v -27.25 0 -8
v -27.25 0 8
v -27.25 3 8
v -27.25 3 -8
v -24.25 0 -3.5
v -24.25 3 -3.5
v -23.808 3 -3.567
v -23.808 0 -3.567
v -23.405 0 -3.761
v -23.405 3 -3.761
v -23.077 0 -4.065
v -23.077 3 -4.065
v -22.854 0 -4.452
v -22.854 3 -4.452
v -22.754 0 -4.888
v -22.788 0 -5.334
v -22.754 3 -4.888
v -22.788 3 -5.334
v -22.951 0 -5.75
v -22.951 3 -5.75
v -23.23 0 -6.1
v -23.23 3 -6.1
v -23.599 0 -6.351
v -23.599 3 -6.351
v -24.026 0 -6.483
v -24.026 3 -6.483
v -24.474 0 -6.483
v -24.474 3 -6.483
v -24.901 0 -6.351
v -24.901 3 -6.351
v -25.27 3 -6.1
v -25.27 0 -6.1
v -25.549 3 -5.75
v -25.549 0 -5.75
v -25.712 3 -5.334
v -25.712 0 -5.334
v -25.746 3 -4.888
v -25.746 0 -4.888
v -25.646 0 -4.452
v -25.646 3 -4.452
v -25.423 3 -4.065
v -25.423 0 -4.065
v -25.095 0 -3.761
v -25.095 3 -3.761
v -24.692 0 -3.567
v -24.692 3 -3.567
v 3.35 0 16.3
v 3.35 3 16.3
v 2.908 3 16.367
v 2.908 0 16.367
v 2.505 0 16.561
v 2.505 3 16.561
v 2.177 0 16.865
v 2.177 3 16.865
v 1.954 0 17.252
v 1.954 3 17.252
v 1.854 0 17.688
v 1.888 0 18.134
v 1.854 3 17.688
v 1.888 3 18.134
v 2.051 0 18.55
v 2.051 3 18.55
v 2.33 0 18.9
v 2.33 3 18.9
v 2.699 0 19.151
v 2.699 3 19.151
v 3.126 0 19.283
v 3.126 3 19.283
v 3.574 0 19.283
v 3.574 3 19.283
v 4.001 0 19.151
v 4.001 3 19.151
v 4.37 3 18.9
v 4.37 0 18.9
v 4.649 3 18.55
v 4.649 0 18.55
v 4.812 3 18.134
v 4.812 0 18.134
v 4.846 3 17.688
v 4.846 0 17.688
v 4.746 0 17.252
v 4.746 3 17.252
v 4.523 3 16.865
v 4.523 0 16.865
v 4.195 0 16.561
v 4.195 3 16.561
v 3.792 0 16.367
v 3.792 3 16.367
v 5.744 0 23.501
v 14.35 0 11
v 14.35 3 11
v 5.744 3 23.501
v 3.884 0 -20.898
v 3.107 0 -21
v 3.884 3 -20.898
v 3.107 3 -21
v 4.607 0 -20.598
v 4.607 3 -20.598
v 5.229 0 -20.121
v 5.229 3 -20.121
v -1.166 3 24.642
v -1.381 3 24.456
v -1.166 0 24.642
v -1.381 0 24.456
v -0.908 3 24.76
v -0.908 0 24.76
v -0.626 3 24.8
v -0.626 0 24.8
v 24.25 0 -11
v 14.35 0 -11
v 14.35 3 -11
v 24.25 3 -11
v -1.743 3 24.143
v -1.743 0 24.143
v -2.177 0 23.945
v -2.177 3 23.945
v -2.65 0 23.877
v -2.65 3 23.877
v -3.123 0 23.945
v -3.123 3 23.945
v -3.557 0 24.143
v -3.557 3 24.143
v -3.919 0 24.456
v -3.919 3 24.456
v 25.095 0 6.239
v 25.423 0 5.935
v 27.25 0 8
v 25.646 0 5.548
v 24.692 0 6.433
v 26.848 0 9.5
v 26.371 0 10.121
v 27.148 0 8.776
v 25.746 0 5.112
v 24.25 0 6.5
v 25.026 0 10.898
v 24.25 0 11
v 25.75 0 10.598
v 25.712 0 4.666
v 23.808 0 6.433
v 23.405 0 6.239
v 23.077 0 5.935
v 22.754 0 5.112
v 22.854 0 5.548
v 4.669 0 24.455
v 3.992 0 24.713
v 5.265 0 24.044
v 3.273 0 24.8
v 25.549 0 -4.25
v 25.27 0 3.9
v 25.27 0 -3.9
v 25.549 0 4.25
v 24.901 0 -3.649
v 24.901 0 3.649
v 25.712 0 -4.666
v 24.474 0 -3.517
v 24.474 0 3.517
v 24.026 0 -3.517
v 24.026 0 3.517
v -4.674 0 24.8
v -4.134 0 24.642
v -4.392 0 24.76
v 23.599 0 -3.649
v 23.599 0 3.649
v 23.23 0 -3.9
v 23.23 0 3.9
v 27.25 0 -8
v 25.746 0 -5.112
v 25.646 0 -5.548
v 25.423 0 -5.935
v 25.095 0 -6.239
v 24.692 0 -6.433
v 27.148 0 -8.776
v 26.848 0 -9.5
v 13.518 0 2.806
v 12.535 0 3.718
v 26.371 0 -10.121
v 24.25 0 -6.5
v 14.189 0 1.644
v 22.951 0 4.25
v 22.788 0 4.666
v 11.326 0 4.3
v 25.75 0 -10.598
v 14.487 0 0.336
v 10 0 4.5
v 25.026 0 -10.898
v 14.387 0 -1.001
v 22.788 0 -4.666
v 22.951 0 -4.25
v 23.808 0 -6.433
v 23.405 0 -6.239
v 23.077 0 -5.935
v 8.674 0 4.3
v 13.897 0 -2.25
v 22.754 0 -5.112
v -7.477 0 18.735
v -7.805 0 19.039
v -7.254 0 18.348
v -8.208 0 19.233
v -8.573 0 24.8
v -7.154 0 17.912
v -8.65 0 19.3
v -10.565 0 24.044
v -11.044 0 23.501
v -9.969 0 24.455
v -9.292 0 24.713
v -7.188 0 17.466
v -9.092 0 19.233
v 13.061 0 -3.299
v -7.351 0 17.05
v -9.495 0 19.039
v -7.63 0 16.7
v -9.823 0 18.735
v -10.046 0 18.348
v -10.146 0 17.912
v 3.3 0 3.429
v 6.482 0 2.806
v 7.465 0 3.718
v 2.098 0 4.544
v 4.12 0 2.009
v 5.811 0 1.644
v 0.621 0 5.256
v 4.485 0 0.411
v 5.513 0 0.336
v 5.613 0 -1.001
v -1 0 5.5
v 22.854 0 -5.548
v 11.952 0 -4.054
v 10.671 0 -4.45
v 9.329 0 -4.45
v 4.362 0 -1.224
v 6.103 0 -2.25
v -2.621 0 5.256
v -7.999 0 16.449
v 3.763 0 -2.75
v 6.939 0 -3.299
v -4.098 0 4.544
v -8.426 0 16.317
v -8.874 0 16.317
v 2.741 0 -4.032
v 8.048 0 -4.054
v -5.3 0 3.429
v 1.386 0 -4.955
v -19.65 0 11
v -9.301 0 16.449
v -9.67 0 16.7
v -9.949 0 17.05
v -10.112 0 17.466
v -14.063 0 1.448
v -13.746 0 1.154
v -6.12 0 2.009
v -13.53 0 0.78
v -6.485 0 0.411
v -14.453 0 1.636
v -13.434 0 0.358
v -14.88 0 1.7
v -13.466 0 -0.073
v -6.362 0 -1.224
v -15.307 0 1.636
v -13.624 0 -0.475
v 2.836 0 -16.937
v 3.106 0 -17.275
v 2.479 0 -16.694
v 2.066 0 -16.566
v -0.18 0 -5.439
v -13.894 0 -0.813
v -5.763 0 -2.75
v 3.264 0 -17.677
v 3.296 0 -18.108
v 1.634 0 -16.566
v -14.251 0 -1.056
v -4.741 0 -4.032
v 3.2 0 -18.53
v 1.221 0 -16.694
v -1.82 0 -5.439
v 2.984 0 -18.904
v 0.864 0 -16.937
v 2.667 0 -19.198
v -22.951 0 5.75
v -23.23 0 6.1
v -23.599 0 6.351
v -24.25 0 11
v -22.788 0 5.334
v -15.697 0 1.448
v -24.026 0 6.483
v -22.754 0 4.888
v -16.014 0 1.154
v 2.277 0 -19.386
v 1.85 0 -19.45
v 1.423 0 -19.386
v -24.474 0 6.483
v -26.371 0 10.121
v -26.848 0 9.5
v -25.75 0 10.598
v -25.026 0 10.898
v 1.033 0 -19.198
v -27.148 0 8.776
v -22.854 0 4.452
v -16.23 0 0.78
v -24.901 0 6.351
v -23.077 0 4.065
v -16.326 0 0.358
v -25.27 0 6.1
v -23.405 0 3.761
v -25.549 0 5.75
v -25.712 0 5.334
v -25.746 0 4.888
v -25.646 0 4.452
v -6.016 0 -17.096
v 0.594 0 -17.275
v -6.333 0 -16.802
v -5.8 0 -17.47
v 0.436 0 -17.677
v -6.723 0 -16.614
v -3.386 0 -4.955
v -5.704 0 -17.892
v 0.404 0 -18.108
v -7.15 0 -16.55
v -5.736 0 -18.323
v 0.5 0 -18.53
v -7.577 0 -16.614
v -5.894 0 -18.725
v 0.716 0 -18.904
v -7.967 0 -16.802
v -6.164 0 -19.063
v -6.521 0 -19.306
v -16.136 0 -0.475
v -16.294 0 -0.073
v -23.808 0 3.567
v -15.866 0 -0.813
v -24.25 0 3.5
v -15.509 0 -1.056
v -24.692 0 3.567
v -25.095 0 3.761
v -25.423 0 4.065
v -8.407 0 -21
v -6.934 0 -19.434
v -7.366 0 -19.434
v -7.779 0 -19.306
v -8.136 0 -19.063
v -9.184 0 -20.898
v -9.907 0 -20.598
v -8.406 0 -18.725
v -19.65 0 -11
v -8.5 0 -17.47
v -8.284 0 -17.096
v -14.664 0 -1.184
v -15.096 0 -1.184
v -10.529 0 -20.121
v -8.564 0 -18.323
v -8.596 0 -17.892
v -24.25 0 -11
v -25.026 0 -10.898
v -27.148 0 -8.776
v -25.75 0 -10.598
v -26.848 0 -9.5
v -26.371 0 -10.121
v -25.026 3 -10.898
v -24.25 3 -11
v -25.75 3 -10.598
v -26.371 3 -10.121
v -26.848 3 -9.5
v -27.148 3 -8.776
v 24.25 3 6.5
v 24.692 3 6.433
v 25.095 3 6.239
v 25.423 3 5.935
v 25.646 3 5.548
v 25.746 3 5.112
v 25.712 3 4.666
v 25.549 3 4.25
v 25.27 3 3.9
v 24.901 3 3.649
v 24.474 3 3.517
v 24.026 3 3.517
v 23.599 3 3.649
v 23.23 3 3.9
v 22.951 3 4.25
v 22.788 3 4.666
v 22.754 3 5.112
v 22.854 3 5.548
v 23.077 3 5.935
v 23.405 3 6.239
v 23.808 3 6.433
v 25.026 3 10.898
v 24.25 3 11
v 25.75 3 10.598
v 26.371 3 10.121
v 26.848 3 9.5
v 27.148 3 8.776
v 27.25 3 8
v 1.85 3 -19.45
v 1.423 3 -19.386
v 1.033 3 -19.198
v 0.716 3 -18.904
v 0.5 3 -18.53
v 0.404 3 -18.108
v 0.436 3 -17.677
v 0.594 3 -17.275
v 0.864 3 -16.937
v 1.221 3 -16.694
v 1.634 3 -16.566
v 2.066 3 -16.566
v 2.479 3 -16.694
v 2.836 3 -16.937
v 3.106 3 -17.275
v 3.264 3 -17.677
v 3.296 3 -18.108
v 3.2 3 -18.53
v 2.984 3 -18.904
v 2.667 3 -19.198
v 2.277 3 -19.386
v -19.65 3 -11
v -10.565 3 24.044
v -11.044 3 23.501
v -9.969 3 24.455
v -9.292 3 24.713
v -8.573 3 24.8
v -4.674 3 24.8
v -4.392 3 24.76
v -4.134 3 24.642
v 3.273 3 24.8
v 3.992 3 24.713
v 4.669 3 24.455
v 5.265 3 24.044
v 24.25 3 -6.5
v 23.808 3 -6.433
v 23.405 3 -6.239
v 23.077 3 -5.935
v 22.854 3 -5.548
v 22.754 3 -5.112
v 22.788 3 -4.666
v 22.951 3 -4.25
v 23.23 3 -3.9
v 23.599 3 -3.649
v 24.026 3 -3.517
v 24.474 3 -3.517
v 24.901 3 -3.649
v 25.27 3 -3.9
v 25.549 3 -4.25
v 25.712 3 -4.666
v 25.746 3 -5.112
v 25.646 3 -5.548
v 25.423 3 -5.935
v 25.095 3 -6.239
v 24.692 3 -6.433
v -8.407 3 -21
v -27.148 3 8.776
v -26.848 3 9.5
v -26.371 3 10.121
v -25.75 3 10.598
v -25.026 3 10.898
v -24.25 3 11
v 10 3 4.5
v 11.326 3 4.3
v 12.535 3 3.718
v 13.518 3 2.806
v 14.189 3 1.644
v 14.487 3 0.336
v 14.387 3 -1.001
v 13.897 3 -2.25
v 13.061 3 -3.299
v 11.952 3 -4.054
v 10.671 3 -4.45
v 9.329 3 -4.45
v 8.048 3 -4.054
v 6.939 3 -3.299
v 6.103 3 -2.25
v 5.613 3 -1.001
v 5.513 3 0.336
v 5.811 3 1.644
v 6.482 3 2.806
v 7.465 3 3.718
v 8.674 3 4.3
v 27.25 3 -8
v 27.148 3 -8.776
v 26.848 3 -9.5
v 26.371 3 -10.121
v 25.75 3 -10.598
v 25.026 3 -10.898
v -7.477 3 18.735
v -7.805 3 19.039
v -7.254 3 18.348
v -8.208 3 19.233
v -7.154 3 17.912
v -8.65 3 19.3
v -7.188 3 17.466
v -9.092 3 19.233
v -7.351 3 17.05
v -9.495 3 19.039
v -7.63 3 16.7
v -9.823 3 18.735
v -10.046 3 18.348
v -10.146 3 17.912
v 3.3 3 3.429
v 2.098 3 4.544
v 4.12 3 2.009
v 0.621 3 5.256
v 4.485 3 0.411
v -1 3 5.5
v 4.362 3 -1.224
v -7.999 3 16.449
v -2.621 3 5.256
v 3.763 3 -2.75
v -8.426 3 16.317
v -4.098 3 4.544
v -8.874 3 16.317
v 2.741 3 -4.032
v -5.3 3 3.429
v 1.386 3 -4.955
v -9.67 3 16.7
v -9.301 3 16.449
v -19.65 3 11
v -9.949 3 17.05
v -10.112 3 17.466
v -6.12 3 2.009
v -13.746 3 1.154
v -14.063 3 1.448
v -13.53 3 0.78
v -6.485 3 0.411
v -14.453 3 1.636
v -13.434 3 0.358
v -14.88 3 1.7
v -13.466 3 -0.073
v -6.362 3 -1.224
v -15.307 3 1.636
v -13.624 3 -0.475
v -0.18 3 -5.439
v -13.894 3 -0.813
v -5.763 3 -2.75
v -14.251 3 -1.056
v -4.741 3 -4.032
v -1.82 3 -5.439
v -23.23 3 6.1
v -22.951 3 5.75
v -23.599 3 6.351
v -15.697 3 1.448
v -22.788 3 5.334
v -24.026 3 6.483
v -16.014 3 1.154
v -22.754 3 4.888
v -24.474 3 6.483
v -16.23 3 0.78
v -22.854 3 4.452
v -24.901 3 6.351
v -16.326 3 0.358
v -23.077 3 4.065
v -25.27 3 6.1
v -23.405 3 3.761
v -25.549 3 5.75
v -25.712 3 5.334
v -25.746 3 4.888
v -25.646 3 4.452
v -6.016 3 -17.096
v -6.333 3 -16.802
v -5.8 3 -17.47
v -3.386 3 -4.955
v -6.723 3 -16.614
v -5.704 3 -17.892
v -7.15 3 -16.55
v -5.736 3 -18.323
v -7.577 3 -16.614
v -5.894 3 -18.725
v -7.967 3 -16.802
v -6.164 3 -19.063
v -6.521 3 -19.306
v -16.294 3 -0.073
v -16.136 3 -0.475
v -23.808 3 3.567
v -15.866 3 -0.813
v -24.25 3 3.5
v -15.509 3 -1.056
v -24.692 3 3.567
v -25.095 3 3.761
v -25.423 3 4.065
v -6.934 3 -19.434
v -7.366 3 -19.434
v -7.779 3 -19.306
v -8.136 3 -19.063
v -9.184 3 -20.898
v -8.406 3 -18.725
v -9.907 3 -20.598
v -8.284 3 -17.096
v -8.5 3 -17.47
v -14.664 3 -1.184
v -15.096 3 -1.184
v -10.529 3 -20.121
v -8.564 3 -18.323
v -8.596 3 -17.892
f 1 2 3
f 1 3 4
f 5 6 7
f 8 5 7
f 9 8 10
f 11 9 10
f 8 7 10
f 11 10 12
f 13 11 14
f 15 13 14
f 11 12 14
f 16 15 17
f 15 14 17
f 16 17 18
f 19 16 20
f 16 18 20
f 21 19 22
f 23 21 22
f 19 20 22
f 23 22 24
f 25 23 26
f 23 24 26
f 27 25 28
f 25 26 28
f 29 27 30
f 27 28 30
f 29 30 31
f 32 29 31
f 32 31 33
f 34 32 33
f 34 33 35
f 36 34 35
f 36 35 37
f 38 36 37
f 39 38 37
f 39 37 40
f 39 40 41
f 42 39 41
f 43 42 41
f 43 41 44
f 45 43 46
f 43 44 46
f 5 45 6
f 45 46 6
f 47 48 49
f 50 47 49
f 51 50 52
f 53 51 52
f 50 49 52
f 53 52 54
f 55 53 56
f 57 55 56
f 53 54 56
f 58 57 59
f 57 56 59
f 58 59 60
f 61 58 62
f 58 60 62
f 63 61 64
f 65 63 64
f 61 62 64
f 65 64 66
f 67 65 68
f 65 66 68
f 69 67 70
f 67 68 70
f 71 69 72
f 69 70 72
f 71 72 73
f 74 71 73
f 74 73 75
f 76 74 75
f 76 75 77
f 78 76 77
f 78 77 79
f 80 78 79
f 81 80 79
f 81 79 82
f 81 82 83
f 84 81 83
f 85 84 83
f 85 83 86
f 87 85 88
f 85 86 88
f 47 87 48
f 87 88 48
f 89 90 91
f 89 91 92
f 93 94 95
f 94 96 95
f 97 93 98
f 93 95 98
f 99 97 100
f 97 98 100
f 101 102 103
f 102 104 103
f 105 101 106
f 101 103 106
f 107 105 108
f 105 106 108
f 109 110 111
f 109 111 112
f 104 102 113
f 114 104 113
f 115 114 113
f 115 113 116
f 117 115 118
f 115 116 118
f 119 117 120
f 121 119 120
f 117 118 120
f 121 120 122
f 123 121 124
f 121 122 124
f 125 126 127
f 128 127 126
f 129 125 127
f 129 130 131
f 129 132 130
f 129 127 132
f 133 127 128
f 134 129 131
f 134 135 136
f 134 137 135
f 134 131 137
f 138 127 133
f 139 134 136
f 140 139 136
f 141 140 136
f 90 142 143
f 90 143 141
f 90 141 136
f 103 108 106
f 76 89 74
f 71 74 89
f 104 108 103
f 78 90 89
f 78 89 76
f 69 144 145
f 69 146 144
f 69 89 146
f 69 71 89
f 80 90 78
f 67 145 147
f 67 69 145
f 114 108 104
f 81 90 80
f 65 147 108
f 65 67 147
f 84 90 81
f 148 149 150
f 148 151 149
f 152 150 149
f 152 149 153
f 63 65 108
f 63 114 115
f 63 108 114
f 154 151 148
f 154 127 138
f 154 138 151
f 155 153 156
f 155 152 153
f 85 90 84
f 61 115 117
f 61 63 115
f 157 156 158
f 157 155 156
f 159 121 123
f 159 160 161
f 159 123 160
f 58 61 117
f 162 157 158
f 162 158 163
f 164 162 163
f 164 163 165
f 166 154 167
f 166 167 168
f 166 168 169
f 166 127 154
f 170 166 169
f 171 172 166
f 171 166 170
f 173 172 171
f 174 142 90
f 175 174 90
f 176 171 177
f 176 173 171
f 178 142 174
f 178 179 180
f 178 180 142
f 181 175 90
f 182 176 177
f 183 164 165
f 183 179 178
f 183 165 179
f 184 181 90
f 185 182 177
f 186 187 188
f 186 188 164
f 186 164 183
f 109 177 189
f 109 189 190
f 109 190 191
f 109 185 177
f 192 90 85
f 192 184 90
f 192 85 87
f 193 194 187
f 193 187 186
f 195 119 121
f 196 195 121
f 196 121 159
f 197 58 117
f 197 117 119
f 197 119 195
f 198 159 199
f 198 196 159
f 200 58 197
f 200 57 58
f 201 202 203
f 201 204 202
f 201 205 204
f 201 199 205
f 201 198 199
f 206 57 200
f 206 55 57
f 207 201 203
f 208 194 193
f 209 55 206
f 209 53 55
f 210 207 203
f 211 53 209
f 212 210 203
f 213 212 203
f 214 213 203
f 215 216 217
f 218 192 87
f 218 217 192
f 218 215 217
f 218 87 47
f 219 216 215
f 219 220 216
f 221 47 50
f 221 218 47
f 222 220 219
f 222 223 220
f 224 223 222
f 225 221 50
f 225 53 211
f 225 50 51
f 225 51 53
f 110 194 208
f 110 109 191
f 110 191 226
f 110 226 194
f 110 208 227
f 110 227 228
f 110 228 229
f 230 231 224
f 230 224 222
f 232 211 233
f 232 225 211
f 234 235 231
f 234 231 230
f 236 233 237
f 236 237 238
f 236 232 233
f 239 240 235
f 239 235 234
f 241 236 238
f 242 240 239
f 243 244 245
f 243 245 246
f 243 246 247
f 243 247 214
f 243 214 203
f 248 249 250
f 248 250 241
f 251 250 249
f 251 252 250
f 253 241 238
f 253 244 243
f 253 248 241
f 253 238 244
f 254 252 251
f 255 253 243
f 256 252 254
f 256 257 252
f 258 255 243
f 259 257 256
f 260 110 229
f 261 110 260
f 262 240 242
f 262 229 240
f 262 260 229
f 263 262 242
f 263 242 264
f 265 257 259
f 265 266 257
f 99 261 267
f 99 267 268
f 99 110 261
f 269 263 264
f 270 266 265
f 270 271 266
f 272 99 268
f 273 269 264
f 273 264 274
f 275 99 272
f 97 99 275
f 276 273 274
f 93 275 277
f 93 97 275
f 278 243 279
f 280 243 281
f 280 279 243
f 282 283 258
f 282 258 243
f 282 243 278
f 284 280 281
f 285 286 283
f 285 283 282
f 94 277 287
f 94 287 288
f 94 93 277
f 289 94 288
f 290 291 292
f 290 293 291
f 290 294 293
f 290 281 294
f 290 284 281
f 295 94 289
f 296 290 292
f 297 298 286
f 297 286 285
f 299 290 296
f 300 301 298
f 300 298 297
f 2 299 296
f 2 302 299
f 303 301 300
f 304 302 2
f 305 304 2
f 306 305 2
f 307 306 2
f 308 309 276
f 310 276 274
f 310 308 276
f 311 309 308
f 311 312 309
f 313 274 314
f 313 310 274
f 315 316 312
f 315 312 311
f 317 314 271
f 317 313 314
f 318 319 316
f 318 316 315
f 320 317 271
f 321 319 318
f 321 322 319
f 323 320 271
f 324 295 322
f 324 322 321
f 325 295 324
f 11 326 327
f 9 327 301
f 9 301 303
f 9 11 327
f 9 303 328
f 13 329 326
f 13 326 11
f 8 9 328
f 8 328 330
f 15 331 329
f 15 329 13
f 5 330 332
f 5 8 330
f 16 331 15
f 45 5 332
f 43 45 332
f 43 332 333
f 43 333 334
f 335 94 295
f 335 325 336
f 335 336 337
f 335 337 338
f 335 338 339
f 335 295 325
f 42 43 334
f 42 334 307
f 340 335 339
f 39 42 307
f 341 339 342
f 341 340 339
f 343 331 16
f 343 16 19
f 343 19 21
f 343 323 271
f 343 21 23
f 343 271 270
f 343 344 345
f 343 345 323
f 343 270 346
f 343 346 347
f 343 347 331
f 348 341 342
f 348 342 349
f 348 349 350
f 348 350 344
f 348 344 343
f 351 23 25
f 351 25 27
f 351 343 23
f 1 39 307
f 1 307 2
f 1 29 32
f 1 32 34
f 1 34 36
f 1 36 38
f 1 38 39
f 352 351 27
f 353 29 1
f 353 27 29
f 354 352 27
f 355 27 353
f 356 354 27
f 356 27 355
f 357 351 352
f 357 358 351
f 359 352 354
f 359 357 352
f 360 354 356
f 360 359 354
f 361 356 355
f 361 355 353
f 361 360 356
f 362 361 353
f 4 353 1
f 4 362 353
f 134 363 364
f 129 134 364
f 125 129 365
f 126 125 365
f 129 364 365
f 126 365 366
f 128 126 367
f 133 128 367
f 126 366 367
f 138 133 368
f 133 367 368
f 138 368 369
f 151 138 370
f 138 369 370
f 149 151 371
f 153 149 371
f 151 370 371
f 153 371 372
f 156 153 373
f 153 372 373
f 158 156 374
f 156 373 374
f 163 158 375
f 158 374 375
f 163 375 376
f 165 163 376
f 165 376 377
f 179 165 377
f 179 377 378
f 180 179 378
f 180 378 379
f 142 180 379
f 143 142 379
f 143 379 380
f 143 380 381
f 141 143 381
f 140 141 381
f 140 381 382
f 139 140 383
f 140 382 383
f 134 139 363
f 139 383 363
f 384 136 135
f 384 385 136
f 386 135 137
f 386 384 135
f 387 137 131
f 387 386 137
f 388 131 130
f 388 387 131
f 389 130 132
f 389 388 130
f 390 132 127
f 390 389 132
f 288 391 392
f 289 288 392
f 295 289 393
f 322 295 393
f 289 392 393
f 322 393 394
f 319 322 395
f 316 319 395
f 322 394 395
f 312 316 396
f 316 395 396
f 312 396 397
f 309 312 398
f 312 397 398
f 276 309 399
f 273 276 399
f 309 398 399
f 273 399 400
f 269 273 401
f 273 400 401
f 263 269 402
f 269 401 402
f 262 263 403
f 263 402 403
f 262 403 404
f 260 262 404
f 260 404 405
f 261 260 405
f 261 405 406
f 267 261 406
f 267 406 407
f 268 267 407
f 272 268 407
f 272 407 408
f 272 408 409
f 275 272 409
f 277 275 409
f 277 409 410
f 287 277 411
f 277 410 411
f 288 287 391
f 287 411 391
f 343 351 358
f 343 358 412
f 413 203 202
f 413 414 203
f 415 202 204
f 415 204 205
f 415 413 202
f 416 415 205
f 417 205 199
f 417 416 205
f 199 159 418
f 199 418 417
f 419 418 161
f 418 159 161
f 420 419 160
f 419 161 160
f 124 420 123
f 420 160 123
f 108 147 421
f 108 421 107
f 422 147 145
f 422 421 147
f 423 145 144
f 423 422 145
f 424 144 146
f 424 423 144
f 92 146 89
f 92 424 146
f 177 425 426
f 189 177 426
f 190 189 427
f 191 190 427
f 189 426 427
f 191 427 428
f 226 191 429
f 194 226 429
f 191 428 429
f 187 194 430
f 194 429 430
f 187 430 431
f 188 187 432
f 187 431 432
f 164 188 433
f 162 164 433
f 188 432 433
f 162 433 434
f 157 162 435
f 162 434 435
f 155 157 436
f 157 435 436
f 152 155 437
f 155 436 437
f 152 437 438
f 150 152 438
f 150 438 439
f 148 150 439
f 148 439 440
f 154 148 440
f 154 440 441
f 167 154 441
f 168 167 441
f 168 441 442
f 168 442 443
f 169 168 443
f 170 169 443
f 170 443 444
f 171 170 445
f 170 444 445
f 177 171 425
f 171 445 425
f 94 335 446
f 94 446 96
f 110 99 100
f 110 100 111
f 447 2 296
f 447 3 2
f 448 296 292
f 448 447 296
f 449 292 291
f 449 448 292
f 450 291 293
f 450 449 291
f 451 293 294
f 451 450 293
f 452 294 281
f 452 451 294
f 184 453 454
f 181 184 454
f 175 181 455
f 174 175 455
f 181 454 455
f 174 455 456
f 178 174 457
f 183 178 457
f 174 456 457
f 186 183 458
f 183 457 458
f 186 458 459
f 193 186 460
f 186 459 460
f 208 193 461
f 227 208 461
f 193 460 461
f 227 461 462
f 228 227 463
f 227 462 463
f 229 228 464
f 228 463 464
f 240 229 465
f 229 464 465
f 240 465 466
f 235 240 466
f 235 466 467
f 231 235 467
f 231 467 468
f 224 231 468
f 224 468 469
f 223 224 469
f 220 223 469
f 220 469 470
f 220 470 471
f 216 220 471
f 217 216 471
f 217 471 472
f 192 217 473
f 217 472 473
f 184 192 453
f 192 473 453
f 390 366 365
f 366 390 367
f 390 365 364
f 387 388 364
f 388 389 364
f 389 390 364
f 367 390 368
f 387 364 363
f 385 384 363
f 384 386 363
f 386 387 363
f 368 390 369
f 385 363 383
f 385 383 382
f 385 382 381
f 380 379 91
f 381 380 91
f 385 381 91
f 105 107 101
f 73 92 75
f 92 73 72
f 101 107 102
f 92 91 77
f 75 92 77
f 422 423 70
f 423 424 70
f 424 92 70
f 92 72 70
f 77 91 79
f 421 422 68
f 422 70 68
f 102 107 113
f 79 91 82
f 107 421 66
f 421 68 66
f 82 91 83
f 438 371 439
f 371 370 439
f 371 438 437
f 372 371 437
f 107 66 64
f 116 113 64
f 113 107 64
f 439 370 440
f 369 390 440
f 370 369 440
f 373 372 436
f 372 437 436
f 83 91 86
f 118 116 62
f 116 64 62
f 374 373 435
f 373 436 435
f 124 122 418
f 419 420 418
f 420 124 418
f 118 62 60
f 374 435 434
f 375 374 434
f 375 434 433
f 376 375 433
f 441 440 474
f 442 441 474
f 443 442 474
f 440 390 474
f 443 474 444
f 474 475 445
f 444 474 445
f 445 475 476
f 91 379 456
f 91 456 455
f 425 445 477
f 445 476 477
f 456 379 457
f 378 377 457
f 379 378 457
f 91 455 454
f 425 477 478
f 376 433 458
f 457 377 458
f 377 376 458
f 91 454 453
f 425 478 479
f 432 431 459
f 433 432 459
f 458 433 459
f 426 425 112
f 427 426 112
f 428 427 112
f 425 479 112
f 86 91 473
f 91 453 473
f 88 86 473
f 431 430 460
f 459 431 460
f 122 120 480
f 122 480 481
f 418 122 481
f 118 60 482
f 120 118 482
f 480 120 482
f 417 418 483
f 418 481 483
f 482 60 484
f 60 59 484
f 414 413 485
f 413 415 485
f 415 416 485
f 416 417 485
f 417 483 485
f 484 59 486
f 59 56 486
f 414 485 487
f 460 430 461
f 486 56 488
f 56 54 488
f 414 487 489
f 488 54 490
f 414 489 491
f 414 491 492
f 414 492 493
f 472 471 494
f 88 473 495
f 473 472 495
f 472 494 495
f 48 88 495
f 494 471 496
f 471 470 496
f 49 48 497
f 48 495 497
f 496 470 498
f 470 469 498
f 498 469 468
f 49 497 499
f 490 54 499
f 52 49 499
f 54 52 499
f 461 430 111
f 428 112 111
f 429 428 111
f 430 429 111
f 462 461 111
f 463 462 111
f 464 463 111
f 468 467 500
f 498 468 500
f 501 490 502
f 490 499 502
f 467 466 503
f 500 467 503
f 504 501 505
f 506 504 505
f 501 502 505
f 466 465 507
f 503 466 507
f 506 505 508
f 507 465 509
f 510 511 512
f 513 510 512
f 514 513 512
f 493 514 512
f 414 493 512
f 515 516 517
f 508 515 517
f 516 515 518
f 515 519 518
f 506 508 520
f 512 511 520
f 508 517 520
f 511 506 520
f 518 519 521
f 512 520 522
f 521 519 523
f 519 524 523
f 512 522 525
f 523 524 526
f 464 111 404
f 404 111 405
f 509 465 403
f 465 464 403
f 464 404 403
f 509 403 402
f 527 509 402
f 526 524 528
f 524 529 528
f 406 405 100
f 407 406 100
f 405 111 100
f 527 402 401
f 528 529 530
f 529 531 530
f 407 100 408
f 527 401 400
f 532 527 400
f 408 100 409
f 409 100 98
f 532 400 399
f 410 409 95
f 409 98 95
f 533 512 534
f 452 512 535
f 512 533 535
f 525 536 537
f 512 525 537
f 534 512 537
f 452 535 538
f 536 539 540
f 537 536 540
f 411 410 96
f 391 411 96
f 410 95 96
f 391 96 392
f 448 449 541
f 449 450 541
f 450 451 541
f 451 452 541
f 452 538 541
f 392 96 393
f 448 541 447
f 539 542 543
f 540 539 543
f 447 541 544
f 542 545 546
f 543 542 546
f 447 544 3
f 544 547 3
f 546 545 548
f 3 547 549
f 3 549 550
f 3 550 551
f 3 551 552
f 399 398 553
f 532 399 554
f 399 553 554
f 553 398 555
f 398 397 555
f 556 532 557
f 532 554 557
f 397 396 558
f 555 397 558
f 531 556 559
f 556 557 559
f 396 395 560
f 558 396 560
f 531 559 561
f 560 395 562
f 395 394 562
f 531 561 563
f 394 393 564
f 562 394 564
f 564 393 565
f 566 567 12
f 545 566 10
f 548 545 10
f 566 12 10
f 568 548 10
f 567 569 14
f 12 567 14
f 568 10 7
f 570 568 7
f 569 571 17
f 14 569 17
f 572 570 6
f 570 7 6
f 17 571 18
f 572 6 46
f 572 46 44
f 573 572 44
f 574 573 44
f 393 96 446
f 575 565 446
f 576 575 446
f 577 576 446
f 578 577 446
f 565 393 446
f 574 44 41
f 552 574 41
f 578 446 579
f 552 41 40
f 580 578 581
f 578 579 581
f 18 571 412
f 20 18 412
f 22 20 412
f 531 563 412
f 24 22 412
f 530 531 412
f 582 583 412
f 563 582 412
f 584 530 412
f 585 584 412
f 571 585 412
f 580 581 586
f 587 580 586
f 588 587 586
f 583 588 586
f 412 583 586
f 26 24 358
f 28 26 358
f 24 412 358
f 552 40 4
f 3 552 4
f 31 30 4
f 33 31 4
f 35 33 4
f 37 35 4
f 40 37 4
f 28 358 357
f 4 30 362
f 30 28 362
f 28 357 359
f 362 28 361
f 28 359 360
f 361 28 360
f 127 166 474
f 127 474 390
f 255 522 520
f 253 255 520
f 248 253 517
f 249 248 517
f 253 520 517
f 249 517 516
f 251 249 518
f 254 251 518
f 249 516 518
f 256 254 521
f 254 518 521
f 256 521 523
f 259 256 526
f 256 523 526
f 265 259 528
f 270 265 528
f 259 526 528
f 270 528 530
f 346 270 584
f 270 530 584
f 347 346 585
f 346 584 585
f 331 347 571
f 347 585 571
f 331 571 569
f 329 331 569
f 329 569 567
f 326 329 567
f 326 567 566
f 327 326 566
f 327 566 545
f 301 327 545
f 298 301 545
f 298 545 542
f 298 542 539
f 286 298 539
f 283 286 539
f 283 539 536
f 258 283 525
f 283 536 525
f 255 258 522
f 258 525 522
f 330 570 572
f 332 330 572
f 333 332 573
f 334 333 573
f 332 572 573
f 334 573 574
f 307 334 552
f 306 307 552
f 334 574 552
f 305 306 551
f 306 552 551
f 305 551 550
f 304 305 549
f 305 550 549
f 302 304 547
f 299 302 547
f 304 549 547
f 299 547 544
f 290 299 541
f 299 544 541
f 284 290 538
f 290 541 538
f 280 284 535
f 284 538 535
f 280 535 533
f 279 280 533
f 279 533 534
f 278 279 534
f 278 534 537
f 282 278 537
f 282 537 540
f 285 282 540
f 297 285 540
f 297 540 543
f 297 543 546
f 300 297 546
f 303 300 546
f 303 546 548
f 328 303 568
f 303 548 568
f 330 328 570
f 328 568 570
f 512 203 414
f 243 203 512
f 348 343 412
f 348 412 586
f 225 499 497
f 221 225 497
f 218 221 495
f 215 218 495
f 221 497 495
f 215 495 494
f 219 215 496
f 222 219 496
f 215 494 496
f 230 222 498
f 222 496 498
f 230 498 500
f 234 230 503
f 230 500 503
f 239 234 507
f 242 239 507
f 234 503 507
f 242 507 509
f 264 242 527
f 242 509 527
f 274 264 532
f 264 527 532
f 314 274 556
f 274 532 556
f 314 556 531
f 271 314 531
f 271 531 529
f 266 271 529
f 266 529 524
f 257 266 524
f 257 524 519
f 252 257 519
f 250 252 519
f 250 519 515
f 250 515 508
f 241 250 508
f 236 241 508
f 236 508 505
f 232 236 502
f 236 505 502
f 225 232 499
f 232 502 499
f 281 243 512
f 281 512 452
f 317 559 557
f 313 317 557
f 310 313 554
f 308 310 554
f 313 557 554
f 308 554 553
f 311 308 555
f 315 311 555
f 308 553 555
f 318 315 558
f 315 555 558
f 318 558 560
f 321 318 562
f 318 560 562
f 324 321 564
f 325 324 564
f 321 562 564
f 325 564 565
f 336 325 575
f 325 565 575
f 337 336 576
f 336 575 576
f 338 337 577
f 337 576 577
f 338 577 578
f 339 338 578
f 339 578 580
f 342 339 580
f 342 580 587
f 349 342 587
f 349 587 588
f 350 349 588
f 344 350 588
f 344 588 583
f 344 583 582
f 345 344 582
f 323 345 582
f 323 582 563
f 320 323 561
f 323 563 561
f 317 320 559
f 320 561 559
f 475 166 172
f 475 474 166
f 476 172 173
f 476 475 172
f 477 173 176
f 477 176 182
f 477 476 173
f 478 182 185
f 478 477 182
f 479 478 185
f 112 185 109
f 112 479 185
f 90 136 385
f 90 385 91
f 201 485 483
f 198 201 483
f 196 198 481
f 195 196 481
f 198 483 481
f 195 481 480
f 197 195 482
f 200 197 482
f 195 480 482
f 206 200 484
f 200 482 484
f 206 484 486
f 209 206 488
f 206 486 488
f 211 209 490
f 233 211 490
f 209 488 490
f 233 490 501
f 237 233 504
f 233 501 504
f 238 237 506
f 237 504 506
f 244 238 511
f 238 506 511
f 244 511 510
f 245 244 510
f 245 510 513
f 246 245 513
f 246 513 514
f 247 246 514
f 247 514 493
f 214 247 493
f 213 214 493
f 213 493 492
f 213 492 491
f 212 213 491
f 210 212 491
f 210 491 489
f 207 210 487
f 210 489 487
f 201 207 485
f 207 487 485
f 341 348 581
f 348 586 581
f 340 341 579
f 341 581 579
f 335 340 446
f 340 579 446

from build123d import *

# Parameters (mm, degrees)
SALIENTE_EXTRUIR1_DEPTH = 3
CROQUIS_BARRIDOS_R      = 1.45
CROQUIS_BARRIDOS_R_2    = 5.5
CROQUIS_BARRIDOS_R_3    = 4.5
CROQUIS_BARRIDOS_R_4    = 1.5
CORTAR_EXTRUIR1_DEPTH   = 3
REDONDEO1_R             = 3
REDONDEO2_R             = 1


with BuildPart() as part:
    # Croquis base → Saliente-Extruir1 (new body)
    with BuildSketch(Plane(origin=(0, 0, 0), x_dir=(1, 0, 0), z_dir=(0, 1, 0))):
        Polygon((-27.25, 11), (-19.65, 11), (-9.65, 21), (4.35, 21), (14.35, 11), (27.25, 11), (27.25, -11), (14.35, -11), (4.85, -24.8), (-10.15, -24.8), (-19.65, -11), (-27.25, -11), align=None)
    extrude(amount=SALIENTE_EXTRUIR1_DEPTH)

    # Croquis barridos → Cortar-Extruir1 (cut)
    with BuildSketch(Plane(origin=(0, 3, 0), x_dir=(1, 0, 0), z_dir=(0, 1, 0))):
        with Locations(Location((-14.88, -0.25, 0), (0, 0, 270))):
            Circle(CROQUIS_BARRIDOS_R)
        with Locations(Location((-1, 0, 0), (0, 0, 270))):
            Circle(CROQUIS_BARRIDOS_R_2)
        with Locations(Location((10, 0, 0), (0, 0, 270))):
            Circle(CROQUIS_BARRIDOS_R_3)
        with Locations(Location((-24.25, 5, 0), (0, 0, 270))):
            Circle(CROQUIS_BARRIDOS_R_4)
        with Locations(Location((24.25, 5, 0), (0, 0, 90))):
            Circle(CROQUIS_BARRIDOS_R_4)
        with Locations(Location((24.25, -5, 0), (0, 0, 270))):
            Circle(CROQUIS_BARRIDOS_R_4)
        with Locations(Location((-24.25, -5, 0), (0, 0, 90))):
            Circle(CROQUIS_BARRIDOS_R_4)
        with Locations(Location((-8.65, -17.8, 0), (0, 0, 270))):
            Circle(CROQUIS_BARRIDOS_R_4)
        with Locations(Location((-7.15, 18, 0), (0, 0, 270))):
            Circle(CROQUIS_BARRIDOS_R)
        with Locations(Location((3.35, -17.8, 0), (0, 0, 90))):
            Circle(CROQUIS_BARRIDOS_R_4)
        with Locations(Location((1.85, 18, 0), (0, 0, 90))):
            Circle(CROQUIS_BARRIDOS_R)
        with BuildLine():
            Line((-4.15, -24.8), (-1.15, -24.8))
            ThreePointArc((-1.15, -24.8), (-2.65, -23.877), (-4.15, -24.8))
        make_face()
    extrude(amount=-CORTAR_EXTRUIR1_DEPTH, mode=Mode.SUBTRACT)

    # Redondeo1
    redondeo1_edges = [part.edges().sort_by_distance(p)[0] for p in [
        (4.85, 1.5, 24.8),
        (-10.15, 1.5, 24.8),
        (-27.25, 1.5, 11),
        (-27.25, 1.5, -11),
        (-9.65, 1.5, -21),
        (4.35, 1.5, -21),
        (27.25, 1.5, -11),
        (27.25, 1.5, 11),
    ]]
    fillet(redondeo1_edges, radius=REDONDEO1_R)

    # Redondeo2
    redondeo2_edges = [part.edges().sort_by_distance(p)[0] for p in [
        (-4.15, 1.5, 24.8),
        (-1.15, 1.5, 24.8),
    ]]
    fillet(redondeo2_edges, radius=REDONDEO2_R)


solid = part.part
